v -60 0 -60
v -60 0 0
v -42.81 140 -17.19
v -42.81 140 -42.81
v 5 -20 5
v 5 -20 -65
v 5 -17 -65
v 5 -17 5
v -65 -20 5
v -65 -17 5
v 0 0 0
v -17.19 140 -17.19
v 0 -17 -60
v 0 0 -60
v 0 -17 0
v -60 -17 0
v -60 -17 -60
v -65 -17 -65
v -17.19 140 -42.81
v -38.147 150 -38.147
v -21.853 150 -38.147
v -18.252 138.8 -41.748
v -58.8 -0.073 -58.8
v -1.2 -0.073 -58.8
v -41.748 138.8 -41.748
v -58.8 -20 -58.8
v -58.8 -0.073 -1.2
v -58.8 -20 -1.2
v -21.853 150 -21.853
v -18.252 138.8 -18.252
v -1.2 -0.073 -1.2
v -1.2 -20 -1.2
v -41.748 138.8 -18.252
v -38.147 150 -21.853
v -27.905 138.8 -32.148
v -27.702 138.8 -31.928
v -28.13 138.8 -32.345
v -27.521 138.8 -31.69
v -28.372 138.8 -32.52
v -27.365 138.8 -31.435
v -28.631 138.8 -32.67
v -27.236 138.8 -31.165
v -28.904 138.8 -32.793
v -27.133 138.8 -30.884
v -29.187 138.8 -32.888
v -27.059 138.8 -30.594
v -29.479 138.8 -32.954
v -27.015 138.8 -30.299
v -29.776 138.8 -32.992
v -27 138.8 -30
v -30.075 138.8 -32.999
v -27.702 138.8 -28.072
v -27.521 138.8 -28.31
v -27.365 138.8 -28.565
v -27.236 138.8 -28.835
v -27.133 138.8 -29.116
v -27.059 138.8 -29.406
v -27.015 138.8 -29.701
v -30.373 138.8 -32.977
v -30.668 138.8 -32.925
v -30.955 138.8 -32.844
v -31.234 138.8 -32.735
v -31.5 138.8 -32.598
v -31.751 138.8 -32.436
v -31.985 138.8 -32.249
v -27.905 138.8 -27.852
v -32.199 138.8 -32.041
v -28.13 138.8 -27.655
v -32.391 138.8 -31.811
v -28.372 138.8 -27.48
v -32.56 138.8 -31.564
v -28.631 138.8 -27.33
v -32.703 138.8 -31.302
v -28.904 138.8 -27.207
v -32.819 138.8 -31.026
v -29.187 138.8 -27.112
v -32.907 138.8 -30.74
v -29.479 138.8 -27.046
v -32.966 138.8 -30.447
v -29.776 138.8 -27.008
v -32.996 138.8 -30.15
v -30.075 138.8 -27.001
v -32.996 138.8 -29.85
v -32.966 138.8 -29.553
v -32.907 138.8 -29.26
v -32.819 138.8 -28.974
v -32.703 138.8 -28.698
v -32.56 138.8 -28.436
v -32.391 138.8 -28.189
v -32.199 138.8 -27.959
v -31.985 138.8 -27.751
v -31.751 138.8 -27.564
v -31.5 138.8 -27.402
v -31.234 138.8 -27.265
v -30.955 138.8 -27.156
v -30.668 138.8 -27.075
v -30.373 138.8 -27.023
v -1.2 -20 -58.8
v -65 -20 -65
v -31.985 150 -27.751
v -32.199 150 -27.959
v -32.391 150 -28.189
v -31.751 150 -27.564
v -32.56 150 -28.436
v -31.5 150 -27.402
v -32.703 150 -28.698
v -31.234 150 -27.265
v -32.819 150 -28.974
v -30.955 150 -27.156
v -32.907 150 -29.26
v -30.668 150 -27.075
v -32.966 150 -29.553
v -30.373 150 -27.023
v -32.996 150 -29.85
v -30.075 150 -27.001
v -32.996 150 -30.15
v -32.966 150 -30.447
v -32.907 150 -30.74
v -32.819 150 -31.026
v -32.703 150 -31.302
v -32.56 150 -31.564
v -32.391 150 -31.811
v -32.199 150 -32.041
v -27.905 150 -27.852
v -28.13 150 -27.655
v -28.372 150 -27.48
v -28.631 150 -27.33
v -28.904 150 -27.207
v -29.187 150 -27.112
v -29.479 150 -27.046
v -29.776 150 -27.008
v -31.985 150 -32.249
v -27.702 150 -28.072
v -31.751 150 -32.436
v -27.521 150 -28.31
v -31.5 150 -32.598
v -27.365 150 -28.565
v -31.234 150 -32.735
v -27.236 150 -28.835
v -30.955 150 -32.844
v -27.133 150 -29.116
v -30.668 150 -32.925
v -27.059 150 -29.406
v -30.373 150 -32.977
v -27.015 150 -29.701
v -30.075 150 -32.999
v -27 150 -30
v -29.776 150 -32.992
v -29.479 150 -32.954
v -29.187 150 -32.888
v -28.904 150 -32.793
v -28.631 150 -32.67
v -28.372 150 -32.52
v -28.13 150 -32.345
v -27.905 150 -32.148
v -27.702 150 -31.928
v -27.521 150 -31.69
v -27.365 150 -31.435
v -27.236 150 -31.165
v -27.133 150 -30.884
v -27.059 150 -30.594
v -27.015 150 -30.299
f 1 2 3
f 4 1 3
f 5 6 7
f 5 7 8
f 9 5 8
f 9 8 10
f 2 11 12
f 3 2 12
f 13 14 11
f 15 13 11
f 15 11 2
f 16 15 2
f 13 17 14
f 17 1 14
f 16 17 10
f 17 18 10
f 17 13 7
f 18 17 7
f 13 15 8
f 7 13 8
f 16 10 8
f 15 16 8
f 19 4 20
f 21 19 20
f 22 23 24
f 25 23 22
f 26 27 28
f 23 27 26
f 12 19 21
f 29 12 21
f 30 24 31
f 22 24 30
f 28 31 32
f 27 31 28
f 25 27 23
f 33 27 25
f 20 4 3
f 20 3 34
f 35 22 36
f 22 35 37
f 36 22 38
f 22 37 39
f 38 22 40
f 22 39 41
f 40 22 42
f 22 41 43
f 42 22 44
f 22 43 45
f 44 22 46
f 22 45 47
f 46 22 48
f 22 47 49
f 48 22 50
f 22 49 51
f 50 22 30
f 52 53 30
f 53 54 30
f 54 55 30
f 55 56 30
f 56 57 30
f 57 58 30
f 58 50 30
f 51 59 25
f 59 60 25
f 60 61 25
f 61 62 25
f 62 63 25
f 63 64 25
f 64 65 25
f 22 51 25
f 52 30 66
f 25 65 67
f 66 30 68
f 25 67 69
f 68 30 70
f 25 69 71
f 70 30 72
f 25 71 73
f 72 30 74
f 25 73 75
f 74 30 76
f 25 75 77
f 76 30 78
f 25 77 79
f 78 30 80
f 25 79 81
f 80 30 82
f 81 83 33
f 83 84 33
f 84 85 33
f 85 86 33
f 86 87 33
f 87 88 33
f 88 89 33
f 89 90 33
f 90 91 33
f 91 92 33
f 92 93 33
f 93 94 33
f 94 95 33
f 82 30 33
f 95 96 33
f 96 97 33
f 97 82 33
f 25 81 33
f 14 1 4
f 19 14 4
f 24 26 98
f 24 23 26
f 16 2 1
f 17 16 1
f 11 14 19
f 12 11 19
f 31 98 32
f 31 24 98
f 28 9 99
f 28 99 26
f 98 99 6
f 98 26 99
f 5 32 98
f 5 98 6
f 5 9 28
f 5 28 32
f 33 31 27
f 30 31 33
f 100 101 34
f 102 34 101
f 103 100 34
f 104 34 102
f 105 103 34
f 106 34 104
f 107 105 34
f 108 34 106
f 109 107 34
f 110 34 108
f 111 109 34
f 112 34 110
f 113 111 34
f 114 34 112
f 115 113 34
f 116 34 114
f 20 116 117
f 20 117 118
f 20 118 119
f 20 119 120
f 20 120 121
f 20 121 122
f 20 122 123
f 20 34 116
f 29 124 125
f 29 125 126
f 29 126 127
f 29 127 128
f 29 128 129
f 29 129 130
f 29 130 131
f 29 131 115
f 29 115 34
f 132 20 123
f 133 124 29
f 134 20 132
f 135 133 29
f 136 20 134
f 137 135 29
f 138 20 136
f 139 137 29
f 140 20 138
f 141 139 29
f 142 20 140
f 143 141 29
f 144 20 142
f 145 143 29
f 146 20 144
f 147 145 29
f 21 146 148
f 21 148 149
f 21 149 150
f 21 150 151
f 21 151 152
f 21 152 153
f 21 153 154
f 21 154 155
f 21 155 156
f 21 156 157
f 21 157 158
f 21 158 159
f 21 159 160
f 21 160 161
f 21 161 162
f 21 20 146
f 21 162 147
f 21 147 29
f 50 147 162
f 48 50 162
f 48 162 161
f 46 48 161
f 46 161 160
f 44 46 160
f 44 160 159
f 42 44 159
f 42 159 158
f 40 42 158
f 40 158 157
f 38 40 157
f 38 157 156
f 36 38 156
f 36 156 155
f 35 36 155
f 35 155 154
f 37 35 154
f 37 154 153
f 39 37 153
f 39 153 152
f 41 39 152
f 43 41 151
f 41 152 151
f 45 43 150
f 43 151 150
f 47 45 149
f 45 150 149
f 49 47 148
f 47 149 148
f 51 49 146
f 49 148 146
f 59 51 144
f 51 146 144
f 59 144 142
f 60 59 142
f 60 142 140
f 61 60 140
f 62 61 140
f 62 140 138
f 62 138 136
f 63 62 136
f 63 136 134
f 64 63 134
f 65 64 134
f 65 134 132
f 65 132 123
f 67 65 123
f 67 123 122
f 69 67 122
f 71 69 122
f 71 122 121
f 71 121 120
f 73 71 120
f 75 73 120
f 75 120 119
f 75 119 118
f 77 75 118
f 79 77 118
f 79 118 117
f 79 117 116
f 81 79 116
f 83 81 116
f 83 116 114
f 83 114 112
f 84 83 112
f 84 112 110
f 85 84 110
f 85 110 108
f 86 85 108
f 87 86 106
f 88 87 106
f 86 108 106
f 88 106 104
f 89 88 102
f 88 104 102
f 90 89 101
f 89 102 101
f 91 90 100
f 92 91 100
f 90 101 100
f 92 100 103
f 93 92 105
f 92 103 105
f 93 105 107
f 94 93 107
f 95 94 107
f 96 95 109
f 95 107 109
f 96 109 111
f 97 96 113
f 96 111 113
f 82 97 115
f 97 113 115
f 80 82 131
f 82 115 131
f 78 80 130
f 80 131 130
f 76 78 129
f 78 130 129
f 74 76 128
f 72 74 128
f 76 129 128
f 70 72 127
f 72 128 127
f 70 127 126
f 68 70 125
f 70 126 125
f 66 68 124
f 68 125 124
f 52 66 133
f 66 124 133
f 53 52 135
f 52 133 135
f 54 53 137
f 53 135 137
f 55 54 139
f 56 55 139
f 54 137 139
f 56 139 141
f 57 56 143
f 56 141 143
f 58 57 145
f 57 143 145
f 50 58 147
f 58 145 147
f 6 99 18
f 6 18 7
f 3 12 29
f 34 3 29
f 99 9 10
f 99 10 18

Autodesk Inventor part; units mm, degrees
ref_plane "YZ Plane" through (0, 0, 0) normal (1, 0, 0) x (0, 1, 0)
ref_plane "XZ Plane" through (0, 0, 0) normal (0, 1, 0) x (-1, 0, 0)
ref_plane "XY Plane" through (0, 0, 0) normal (0, 0, 1) x (1, 0, 0)
sketch "Sketch1" plane through (0, 0, 0) normal (0, 1, 0) x (-1, 0, 0)
  line L0 (0, 0) -> (60, 0)
  line L1 (60, 0) -> (60, -60)
  line L2 (60, -60) -> (0, -60)
  line L3 (0, -60) -> (0, 0)
  point P0 (30, -60)
  point P1 (0, -30)
  dimension "d1" = 60
extrude "Extrusion1" add sketch "Sketch1" against normal blind 20
extrude "Extrusion2" add sketch "Sketch1" along normal blind 140 draft -7
shell "Shell1" thickness 1.2 removed faces 1 at (-20, -20, -20)
sketch "Sketch2" plane through (0, 140, 0) normal (0, 1, 0) x (1, 0, 0)
  line L0 (-17.1898, 42.8102) -> (-17.1898, 17.1898) projected
  line L1 (-42.8102, 42.8102) -> (-17.1898, 42.8102) projected
  line L2 (-42.8102, 17.1898) -> (-42.8102, 42.8102) projected
  line L3 (-17.1898, 17.1898) -> (-42.8102, 17.1898) projected
  circle A0 centre (-30, 30) radius 3
  point P0 (0, 0)
  point P1 (-30, 42.8102)
  point P2 (-42.8102, 30)
  dimension "d7" = 6
extrude "Extrusion4" add sketch "Sketch2" along normal blind 10 draft -25 contours L0 L3 L2 L1 | A0
extrude "Extrusion3" cut sketch "Sketch2" along normal mid plane 25.4 contours A0
sketch "Sketch4" plane through (0, -20, 0) normal (0, -1, 0) x (1, 0, 0)
  line L0 (-65, -65) -> (5, -65)
  line L1 (5, -65) -> (5, 5)
  line L2 (5, 5) -> (-65, 5)
  line L3 (-65, 5) -> (-65, -65)
  line L4 (-58.8, -1.2) -> (-1.2, -1.2) projected
  line L5 (-1.2, -1.2) -> (-1.2, -58.8) projected
  line L6 (-58.8, -58.8) -> (-58.8, -1.2) projected
  line L7 (-1.2, -58.8) -> (-58.8, -58.8) projected
  point P0 (0, 0)
  point P1 (-30, 5)
  point P2 (-30, -1.2)
  point P3 (5, -30)
  point P4 (-1.2, -30)
  dimension "d16" = 70
extrude "Extrusion6" add sketch "Sketch4" against normal blind 3
properties part number "VRSPAD-144 illumination box"
